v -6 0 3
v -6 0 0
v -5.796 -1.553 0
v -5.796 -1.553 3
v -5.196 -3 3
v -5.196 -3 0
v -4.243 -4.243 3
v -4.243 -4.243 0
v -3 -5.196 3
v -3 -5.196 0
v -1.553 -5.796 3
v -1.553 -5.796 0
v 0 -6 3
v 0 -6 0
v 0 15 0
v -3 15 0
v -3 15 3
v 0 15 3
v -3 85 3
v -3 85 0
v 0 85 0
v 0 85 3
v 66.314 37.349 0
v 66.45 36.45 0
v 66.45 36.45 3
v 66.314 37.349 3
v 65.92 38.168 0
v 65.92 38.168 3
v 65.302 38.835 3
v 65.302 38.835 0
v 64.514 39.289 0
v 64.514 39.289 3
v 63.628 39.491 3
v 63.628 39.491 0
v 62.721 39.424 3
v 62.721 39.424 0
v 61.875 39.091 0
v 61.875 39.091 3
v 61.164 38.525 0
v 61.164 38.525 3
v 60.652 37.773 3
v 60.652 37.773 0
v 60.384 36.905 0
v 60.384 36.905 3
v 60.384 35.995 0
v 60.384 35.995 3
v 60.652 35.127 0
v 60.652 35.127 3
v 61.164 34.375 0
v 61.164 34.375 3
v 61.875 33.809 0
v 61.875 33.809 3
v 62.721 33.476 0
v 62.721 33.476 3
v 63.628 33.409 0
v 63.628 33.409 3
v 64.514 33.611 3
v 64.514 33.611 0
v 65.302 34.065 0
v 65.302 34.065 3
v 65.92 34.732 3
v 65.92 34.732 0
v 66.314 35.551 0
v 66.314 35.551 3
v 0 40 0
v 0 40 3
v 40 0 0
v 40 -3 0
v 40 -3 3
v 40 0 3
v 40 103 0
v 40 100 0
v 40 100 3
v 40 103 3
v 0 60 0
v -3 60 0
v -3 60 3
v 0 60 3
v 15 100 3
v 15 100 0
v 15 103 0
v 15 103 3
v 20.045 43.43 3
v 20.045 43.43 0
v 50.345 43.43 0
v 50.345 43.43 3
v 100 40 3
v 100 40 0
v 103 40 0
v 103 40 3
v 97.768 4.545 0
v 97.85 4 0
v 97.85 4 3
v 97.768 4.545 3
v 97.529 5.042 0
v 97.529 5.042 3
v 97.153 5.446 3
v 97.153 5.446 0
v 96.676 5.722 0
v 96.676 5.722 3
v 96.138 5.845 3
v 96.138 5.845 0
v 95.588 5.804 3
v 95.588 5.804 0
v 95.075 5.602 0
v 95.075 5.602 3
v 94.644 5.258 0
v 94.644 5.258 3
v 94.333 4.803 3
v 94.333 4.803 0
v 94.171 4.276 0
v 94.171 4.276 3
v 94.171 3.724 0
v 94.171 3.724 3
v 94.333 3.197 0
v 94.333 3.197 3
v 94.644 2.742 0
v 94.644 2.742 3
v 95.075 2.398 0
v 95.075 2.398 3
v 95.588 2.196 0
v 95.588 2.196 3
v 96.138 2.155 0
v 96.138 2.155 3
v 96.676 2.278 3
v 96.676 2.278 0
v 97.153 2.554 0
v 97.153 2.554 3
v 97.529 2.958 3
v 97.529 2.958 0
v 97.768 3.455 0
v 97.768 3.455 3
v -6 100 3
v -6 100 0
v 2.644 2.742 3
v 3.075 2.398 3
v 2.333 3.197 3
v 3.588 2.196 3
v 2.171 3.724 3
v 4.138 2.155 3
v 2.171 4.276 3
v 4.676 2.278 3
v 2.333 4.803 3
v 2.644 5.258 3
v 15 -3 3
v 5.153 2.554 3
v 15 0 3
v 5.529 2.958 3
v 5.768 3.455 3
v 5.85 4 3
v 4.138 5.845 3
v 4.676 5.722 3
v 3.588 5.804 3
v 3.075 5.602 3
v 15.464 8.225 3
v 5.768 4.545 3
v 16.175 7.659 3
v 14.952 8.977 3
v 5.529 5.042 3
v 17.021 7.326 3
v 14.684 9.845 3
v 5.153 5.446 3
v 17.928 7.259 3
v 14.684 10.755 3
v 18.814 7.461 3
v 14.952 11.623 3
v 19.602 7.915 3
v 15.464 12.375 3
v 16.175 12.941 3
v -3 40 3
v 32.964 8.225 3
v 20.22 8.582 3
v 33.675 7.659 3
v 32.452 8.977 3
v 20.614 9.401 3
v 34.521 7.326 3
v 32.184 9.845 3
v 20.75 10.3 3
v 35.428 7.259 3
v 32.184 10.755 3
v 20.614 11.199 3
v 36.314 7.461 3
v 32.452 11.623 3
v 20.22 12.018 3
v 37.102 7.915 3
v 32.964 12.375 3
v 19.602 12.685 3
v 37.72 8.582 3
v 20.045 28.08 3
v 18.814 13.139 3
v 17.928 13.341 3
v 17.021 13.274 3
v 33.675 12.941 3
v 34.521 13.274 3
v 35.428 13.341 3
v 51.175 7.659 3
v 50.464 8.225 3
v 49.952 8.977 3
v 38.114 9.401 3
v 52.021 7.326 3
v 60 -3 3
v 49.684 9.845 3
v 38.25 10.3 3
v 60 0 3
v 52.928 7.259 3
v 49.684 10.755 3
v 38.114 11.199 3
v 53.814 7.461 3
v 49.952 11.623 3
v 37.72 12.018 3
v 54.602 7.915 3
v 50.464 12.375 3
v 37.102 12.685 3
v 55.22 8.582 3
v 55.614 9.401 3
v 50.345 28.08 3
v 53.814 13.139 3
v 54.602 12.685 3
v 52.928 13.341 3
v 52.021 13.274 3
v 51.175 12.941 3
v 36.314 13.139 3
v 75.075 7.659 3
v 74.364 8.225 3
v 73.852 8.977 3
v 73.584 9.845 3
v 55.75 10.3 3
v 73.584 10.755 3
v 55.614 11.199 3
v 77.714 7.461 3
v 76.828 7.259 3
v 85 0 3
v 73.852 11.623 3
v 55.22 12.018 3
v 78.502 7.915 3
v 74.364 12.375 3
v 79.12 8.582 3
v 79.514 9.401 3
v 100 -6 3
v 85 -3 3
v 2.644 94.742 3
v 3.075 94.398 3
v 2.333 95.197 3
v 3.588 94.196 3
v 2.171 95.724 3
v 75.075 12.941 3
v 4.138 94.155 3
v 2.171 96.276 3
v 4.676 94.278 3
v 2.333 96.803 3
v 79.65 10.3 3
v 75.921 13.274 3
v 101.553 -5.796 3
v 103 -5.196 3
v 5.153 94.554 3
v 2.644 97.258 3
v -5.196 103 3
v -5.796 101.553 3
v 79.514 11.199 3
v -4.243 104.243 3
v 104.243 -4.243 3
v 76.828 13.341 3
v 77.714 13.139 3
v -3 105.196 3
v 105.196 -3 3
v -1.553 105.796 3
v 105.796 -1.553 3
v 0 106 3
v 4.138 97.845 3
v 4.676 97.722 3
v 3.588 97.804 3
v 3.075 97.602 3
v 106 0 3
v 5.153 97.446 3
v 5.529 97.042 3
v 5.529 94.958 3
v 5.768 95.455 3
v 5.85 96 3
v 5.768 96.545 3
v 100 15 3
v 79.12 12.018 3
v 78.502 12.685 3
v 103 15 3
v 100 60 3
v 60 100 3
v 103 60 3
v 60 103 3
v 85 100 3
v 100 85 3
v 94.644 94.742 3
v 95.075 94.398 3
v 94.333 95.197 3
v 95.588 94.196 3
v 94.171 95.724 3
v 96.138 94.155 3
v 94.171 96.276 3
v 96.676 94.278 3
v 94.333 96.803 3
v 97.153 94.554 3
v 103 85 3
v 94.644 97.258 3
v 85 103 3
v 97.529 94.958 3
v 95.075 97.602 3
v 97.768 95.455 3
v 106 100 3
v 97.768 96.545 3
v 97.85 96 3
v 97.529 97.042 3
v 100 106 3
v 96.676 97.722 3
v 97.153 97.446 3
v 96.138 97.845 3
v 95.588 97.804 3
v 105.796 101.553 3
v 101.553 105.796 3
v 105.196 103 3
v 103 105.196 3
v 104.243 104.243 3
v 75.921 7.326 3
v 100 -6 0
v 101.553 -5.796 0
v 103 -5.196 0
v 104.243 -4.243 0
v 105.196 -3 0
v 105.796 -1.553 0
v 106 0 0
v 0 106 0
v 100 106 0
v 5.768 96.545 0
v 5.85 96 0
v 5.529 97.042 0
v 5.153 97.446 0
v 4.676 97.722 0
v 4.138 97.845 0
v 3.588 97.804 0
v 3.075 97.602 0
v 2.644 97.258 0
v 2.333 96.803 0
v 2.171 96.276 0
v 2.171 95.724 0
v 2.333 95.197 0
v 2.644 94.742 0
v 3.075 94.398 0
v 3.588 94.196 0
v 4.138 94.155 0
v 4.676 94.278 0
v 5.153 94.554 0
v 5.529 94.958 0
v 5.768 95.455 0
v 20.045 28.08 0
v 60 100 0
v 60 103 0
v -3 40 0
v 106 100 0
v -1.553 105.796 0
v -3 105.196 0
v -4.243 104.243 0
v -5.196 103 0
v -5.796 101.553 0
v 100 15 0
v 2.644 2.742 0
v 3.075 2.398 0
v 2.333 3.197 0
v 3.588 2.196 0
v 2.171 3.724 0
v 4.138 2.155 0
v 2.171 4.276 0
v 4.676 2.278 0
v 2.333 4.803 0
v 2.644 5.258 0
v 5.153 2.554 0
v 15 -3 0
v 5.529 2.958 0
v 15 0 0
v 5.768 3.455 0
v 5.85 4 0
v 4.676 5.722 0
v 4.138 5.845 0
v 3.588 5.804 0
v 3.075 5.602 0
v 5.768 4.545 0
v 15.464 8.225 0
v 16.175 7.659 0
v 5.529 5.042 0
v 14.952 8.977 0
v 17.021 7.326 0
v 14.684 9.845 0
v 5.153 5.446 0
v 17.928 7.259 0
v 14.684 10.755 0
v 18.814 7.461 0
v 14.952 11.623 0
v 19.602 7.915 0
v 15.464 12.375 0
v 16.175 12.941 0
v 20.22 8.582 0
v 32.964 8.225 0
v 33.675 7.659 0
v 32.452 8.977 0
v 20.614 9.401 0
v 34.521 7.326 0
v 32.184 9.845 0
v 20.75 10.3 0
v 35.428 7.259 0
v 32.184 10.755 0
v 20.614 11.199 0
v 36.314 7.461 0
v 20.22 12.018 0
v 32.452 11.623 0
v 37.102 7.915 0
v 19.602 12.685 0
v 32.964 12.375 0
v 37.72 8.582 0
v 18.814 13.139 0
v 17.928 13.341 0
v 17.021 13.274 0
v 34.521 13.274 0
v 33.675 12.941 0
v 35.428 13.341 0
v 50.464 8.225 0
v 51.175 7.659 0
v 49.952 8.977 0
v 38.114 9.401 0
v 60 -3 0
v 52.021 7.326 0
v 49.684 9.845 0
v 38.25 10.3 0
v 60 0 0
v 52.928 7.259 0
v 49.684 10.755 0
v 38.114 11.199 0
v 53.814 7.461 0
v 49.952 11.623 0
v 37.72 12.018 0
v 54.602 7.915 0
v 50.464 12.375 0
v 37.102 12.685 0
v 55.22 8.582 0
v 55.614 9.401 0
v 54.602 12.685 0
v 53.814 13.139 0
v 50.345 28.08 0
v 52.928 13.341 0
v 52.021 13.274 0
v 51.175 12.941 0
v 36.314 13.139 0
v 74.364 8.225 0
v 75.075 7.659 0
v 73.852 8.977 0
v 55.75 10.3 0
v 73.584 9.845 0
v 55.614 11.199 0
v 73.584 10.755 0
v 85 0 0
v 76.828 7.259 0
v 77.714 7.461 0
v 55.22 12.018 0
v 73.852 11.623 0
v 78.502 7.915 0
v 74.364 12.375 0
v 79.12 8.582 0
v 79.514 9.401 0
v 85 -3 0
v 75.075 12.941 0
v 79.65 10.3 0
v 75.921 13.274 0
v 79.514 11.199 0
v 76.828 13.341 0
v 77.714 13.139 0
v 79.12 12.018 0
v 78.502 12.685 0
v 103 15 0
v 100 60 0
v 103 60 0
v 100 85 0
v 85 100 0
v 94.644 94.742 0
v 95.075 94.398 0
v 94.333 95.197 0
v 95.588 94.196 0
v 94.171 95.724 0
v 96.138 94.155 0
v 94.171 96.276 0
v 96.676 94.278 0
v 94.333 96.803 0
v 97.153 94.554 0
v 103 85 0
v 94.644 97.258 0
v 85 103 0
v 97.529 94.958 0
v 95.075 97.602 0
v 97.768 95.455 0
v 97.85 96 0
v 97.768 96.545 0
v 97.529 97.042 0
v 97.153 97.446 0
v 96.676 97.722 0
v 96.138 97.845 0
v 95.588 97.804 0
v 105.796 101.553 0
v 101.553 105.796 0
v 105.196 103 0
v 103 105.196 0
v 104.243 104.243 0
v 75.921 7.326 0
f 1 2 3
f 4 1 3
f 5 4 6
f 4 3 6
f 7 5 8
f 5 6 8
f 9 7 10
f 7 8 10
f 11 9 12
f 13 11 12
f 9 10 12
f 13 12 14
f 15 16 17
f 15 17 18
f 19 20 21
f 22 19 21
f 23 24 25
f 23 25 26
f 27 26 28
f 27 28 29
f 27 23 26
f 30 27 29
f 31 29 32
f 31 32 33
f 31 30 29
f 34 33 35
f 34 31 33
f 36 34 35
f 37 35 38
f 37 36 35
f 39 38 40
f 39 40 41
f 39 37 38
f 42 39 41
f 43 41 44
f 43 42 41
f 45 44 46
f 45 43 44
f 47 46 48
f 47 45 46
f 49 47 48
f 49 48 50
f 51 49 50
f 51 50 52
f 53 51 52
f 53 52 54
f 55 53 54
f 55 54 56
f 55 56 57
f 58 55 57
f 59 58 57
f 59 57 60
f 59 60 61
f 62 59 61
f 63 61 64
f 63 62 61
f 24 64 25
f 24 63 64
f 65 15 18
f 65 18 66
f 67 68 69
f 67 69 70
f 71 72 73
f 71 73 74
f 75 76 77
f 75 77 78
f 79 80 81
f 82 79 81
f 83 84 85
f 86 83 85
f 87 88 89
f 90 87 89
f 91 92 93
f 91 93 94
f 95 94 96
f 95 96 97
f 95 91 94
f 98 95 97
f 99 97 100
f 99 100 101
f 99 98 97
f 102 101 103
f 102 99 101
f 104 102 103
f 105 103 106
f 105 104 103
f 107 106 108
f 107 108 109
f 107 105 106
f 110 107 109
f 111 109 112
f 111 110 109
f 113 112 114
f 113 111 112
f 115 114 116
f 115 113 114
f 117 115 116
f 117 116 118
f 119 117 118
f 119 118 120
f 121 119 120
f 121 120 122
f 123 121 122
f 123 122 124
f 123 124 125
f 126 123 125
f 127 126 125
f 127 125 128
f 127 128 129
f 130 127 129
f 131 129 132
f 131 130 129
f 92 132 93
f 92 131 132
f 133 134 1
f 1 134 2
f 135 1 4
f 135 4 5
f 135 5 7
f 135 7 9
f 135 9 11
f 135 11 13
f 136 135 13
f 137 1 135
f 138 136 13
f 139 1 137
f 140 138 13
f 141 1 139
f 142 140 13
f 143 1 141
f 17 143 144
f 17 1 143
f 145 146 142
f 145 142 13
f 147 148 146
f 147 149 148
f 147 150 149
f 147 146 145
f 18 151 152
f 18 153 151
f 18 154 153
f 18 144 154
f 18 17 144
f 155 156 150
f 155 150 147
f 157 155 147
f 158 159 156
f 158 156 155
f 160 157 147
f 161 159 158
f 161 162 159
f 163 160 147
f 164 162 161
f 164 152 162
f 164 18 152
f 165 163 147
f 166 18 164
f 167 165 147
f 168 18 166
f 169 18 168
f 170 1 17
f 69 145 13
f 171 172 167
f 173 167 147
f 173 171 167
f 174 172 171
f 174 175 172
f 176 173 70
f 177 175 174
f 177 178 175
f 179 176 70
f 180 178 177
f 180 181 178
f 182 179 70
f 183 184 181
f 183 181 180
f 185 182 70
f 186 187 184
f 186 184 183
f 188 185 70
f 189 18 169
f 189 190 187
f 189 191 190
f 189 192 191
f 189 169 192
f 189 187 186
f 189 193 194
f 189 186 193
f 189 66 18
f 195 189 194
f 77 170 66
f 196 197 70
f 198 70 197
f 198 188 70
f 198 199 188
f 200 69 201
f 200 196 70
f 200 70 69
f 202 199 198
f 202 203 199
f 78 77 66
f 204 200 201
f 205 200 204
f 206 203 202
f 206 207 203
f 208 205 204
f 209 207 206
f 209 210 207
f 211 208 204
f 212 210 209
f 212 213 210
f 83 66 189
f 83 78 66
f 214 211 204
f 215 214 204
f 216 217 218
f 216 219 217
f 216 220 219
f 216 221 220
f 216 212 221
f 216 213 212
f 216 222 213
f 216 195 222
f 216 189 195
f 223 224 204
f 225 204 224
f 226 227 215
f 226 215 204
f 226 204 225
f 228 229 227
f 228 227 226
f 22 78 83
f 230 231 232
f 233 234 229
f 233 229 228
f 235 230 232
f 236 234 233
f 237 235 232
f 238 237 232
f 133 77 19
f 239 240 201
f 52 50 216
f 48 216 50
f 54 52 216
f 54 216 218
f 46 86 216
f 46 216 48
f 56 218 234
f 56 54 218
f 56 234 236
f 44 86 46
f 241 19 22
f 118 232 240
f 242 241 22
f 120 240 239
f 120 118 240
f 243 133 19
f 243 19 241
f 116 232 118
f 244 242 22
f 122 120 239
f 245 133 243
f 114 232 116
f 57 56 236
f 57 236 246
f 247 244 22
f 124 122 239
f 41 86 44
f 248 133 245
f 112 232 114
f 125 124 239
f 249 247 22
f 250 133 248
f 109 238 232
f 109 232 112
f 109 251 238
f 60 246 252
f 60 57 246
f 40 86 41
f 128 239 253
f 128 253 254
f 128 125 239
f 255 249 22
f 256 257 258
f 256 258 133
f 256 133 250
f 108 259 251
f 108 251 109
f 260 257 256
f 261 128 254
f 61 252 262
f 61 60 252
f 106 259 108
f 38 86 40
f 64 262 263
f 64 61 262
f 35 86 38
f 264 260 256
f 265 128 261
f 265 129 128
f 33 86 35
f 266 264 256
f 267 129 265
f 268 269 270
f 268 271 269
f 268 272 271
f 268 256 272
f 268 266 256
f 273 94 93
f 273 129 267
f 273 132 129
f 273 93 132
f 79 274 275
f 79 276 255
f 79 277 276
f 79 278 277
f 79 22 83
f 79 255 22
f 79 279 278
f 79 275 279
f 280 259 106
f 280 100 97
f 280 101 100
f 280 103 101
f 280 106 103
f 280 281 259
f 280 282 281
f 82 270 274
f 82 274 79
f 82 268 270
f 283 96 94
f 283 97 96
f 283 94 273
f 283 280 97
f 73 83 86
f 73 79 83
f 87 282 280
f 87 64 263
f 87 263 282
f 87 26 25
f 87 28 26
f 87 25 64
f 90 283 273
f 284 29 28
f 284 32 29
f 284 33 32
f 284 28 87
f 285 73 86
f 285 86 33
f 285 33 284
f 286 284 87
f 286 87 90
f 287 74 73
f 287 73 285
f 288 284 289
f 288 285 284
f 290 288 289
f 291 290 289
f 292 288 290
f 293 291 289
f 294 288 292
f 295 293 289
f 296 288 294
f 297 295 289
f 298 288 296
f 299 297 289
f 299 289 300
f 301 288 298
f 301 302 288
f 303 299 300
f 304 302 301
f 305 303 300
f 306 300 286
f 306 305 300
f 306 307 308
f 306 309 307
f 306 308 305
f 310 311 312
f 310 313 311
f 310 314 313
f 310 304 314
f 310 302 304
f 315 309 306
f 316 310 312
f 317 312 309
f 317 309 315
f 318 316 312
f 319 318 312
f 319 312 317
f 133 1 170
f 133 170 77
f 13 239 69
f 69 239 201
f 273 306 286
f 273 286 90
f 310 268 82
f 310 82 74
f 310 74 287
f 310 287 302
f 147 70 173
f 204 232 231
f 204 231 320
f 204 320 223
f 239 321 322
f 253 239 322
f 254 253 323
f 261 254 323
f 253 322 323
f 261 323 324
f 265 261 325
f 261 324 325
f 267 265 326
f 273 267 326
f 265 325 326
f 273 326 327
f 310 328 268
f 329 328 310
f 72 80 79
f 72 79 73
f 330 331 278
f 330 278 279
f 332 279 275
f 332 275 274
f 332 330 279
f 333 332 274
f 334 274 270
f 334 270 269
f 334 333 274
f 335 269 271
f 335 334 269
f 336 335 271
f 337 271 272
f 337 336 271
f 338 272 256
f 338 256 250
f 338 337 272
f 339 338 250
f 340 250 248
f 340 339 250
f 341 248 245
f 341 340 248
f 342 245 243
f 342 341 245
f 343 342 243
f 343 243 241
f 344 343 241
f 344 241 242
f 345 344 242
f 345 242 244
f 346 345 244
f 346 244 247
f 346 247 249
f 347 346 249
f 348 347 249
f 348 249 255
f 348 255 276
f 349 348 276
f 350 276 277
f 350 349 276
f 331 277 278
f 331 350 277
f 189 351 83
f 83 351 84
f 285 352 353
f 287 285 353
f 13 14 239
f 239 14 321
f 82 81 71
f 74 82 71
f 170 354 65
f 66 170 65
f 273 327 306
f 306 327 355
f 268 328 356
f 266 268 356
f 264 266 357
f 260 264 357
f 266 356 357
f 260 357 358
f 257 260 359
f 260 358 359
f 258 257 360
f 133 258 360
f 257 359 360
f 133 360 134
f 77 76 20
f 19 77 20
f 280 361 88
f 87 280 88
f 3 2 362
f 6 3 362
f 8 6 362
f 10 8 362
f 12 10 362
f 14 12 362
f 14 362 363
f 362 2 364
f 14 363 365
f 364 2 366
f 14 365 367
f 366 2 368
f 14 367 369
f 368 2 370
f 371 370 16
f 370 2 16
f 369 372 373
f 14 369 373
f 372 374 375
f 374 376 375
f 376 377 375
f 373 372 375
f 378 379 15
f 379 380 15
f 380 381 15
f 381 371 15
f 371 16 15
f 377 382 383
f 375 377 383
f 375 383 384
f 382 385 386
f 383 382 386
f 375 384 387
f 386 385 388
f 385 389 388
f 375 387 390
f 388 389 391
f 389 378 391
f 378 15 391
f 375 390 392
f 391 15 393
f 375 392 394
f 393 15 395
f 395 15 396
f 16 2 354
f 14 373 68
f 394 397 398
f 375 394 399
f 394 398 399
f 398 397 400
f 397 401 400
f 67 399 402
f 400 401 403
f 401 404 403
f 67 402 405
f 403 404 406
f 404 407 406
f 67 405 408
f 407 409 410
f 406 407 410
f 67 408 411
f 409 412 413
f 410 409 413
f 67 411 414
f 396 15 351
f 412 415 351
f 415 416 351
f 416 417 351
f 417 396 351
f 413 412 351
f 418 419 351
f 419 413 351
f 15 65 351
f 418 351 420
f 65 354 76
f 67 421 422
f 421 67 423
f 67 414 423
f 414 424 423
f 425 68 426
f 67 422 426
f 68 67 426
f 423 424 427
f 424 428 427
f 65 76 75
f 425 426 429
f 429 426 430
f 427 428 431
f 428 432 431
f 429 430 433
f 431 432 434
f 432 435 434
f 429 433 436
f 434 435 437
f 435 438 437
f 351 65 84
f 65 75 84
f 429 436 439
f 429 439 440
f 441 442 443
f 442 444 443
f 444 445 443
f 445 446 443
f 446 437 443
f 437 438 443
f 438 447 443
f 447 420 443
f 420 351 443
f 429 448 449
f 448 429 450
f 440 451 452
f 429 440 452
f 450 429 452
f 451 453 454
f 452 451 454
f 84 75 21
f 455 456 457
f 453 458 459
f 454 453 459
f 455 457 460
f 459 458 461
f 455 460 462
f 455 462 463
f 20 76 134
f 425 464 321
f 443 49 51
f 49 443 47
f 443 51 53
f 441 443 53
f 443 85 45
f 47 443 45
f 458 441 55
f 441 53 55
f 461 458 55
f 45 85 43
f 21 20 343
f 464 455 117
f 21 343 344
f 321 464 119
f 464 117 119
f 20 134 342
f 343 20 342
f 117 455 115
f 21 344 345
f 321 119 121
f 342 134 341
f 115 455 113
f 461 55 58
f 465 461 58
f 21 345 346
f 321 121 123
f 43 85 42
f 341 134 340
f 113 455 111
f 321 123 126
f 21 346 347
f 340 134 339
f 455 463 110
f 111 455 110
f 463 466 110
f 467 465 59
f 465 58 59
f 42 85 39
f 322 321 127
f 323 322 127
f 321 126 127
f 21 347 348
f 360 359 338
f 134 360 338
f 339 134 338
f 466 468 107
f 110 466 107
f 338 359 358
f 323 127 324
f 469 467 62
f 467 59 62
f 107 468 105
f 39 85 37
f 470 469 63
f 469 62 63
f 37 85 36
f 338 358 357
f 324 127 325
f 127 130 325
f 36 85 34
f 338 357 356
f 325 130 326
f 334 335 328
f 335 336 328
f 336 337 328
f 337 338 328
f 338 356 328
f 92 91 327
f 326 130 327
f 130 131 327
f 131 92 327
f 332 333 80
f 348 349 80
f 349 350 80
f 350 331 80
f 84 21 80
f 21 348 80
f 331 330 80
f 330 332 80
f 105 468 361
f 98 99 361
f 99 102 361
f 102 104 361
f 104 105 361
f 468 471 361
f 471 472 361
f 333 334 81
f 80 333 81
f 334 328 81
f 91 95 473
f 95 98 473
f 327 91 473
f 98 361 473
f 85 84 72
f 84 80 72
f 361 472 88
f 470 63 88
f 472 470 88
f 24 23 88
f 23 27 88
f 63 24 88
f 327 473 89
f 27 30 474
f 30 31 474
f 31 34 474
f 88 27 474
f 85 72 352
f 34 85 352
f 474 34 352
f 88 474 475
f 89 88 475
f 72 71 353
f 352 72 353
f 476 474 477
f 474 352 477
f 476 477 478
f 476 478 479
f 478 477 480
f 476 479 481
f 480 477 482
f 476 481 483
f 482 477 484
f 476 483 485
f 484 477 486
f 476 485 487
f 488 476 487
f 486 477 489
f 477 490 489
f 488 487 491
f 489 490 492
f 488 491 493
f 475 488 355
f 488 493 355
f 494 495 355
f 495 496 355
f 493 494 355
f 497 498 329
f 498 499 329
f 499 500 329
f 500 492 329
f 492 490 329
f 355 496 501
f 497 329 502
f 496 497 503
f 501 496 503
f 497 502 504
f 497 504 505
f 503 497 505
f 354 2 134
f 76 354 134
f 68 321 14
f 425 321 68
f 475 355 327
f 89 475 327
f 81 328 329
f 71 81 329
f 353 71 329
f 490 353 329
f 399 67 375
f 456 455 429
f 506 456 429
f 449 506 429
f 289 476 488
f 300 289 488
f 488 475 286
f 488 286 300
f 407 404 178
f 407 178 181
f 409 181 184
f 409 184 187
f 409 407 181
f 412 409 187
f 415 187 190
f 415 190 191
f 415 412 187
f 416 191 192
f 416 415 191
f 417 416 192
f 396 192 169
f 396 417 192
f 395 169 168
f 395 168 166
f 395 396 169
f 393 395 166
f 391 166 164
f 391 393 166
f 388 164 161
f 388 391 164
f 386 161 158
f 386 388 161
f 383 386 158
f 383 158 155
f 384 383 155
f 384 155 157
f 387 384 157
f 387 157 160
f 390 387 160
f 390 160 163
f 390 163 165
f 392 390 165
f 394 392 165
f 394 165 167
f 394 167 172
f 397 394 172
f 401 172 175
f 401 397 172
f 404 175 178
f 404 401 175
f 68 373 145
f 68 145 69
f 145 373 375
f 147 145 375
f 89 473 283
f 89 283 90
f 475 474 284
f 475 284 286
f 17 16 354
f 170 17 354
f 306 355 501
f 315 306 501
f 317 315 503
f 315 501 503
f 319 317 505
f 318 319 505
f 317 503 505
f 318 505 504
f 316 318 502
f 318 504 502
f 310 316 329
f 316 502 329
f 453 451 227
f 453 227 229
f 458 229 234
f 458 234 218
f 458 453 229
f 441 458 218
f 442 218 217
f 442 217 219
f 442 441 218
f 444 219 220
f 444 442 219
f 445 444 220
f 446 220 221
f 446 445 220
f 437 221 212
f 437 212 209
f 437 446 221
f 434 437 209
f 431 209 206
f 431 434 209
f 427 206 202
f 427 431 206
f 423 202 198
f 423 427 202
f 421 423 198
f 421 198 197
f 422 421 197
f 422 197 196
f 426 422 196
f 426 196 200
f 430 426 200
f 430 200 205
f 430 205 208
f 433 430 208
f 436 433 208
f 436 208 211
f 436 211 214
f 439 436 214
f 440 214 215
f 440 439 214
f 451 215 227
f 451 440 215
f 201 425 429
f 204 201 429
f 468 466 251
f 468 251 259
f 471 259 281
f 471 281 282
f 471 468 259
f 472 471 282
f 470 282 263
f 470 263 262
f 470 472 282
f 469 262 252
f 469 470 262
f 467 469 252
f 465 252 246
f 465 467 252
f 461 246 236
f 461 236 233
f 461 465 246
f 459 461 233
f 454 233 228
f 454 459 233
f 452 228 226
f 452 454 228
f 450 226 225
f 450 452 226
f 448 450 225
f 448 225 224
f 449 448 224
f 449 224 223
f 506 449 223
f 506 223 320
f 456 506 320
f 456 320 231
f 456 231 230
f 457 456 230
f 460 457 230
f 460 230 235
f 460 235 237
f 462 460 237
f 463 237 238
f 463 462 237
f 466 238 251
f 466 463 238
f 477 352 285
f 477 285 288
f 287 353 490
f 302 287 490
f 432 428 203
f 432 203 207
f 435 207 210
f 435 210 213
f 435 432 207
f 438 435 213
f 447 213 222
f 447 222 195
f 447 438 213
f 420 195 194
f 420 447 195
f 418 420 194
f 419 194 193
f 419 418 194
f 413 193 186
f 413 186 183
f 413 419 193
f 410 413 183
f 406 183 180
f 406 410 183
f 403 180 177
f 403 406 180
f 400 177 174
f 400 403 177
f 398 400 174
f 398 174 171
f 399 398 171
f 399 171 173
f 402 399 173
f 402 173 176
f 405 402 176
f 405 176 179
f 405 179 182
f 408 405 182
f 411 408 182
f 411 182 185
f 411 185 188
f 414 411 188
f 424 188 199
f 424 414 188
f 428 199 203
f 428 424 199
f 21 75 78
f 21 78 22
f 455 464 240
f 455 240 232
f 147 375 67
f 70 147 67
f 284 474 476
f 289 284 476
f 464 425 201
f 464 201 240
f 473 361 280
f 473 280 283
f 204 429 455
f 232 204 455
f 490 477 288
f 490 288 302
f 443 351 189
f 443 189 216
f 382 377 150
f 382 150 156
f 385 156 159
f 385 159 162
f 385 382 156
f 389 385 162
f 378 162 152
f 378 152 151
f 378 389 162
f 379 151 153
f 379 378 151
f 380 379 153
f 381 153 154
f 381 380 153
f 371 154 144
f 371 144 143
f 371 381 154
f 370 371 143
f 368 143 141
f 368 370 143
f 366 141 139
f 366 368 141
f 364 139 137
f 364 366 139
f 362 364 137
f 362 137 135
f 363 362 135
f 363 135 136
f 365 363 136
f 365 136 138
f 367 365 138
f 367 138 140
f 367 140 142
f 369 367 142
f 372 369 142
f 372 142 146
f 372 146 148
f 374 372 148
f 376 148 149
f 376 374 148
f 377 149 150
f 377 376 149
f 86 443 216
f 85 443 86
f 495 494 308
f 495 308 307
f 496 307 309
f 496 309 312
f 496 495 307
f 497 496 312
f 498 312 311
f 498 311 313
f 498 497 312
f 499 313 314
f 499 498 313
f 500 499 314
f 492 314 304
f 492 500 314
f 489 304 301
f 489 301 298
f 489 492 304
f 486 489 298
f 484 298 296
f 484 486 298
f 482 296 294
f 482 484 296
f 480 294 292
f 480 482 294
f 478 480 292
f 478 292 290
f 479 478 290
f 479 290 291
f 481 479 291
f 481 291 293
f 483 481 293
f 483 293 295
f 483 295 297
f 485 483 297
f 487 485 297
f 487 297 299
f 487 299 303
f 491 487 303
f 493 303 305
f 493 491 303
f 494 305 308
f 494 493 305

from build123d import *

# Parameters (mm, degrees)
SKETCH_R      = 3.05
SKETCH_R_2    = 1.85
SKETCH_W      = 30.3
SKETCH_H      = 15.35
SKETCH_W_2    = 25
SKETCH_H_2    = 3
SKETCH_W_3    = 3
SKETCH_H_3    = 25
EXTRUDE_DEPTH = 3


with BuildPart() as part:
    # Sketch → Extrude (new body)
    with BuildSketch(Plane.XY):
        with BuildLine():
            ThreePointArc((0, 106), (-4.242641, 104.242641), (-6, 100))
            Line((-6, 100), (-6, 0))
            ThreePointArc((-6, 0), (-4.242641, -4.242641), (0, -6))
            Line((0, -6), (100, -6))
            ThreePointArc((100, -6), (104.242641, -4.242641), (106, 0))
            Line((106, 0), (106, 100))
            ThreePointArc((106, 100), (104.242641, 104.242641), (100, 106))
            Line((0, 106), (100, 106))
        make_face()
        with Locations((17.7, 10.3)):
            Circle(SKETCH_R, mode=Mode.SUBTRACT)
        with Locations((35.2, 10.3)):
            Circle(SKETCH_R, mode=Mode.SUBTRACT)
        with Locations((52.7, 10.3)):
            Circle(SKETCH_R, mode=Mode.SUBTRACT)
        with Locations((76.6, 10.3)):
            Circle(SKETCH_R, mode=Mode.SUBTRACT)
        with Locations((63.4, 36.45)):
            Circle(SKETCH_R, mode=Mode.SUBTRACT)
        with Locations((4, 96)):
            Circle(SKETCH_R_2, mode=Mode.SUBTRACT)
        with Locations((96, 96)):
            Circle(SKETCH_R_2, mode=Mode.SUBTRACT)
        with Locations((96, 4)):
            Circle(SKETCH_R_2, mode=Mode.SUBTRACT)
        with Locations((4, 4)):
            Circle(SKETCH_R_2, mode=Mode.SUBTRACT)
        with Locations((35.195, 35.755)):
            Rectangle(SKETCH_W, SKETCH_H, mode=Mode.SUBTRACT)
        with Locations((27.5, 101.5)):
            Rectangle(SKETCH_W_2, SKETCH_H_2, mode=Mode.SUBTRACT)
        with Locations((72.5, 101.5)):
            Rectangle(SKETCH_W_2, SKETCH_H_2, mode=Mode.SUBTRACT)
        with Locations((101.5, 72.5)):
            Rectangle(SKETCH_W_3, SKETCH_H_3, mode=Mode.SUBTRACT)
        with Locations((101.5, 27.5)):
            Rectangle(SKETCH_W_3, SKETCH_H_3, mode=Mode.SUBTRACT)
        with Locations((72.5, -1.5)):
            Rectangle(SKETCH_W_2, SKETCH_H_2, mode=Mode.SUBTRACT)
        with Locations((27.5, -1.5)):
            Rectangle(SKETCH_W_2, SKETCH_H_2, mode=Mode.SUBTRACT)
        with Locations((-1.5, 27.5)):
            Rectangle(SKETCH_W_3, SKETCH_H_3, mode=Mode.SUBTRACT)
        with Locations((-1.5, 72.5)):
            Rectangle(SKETCH_W_3, SKETCH_H_3, mode=Mode.SUBTRACT)
    extrude(amount=EXTRUDE_DEPTH)


solid = part.part
